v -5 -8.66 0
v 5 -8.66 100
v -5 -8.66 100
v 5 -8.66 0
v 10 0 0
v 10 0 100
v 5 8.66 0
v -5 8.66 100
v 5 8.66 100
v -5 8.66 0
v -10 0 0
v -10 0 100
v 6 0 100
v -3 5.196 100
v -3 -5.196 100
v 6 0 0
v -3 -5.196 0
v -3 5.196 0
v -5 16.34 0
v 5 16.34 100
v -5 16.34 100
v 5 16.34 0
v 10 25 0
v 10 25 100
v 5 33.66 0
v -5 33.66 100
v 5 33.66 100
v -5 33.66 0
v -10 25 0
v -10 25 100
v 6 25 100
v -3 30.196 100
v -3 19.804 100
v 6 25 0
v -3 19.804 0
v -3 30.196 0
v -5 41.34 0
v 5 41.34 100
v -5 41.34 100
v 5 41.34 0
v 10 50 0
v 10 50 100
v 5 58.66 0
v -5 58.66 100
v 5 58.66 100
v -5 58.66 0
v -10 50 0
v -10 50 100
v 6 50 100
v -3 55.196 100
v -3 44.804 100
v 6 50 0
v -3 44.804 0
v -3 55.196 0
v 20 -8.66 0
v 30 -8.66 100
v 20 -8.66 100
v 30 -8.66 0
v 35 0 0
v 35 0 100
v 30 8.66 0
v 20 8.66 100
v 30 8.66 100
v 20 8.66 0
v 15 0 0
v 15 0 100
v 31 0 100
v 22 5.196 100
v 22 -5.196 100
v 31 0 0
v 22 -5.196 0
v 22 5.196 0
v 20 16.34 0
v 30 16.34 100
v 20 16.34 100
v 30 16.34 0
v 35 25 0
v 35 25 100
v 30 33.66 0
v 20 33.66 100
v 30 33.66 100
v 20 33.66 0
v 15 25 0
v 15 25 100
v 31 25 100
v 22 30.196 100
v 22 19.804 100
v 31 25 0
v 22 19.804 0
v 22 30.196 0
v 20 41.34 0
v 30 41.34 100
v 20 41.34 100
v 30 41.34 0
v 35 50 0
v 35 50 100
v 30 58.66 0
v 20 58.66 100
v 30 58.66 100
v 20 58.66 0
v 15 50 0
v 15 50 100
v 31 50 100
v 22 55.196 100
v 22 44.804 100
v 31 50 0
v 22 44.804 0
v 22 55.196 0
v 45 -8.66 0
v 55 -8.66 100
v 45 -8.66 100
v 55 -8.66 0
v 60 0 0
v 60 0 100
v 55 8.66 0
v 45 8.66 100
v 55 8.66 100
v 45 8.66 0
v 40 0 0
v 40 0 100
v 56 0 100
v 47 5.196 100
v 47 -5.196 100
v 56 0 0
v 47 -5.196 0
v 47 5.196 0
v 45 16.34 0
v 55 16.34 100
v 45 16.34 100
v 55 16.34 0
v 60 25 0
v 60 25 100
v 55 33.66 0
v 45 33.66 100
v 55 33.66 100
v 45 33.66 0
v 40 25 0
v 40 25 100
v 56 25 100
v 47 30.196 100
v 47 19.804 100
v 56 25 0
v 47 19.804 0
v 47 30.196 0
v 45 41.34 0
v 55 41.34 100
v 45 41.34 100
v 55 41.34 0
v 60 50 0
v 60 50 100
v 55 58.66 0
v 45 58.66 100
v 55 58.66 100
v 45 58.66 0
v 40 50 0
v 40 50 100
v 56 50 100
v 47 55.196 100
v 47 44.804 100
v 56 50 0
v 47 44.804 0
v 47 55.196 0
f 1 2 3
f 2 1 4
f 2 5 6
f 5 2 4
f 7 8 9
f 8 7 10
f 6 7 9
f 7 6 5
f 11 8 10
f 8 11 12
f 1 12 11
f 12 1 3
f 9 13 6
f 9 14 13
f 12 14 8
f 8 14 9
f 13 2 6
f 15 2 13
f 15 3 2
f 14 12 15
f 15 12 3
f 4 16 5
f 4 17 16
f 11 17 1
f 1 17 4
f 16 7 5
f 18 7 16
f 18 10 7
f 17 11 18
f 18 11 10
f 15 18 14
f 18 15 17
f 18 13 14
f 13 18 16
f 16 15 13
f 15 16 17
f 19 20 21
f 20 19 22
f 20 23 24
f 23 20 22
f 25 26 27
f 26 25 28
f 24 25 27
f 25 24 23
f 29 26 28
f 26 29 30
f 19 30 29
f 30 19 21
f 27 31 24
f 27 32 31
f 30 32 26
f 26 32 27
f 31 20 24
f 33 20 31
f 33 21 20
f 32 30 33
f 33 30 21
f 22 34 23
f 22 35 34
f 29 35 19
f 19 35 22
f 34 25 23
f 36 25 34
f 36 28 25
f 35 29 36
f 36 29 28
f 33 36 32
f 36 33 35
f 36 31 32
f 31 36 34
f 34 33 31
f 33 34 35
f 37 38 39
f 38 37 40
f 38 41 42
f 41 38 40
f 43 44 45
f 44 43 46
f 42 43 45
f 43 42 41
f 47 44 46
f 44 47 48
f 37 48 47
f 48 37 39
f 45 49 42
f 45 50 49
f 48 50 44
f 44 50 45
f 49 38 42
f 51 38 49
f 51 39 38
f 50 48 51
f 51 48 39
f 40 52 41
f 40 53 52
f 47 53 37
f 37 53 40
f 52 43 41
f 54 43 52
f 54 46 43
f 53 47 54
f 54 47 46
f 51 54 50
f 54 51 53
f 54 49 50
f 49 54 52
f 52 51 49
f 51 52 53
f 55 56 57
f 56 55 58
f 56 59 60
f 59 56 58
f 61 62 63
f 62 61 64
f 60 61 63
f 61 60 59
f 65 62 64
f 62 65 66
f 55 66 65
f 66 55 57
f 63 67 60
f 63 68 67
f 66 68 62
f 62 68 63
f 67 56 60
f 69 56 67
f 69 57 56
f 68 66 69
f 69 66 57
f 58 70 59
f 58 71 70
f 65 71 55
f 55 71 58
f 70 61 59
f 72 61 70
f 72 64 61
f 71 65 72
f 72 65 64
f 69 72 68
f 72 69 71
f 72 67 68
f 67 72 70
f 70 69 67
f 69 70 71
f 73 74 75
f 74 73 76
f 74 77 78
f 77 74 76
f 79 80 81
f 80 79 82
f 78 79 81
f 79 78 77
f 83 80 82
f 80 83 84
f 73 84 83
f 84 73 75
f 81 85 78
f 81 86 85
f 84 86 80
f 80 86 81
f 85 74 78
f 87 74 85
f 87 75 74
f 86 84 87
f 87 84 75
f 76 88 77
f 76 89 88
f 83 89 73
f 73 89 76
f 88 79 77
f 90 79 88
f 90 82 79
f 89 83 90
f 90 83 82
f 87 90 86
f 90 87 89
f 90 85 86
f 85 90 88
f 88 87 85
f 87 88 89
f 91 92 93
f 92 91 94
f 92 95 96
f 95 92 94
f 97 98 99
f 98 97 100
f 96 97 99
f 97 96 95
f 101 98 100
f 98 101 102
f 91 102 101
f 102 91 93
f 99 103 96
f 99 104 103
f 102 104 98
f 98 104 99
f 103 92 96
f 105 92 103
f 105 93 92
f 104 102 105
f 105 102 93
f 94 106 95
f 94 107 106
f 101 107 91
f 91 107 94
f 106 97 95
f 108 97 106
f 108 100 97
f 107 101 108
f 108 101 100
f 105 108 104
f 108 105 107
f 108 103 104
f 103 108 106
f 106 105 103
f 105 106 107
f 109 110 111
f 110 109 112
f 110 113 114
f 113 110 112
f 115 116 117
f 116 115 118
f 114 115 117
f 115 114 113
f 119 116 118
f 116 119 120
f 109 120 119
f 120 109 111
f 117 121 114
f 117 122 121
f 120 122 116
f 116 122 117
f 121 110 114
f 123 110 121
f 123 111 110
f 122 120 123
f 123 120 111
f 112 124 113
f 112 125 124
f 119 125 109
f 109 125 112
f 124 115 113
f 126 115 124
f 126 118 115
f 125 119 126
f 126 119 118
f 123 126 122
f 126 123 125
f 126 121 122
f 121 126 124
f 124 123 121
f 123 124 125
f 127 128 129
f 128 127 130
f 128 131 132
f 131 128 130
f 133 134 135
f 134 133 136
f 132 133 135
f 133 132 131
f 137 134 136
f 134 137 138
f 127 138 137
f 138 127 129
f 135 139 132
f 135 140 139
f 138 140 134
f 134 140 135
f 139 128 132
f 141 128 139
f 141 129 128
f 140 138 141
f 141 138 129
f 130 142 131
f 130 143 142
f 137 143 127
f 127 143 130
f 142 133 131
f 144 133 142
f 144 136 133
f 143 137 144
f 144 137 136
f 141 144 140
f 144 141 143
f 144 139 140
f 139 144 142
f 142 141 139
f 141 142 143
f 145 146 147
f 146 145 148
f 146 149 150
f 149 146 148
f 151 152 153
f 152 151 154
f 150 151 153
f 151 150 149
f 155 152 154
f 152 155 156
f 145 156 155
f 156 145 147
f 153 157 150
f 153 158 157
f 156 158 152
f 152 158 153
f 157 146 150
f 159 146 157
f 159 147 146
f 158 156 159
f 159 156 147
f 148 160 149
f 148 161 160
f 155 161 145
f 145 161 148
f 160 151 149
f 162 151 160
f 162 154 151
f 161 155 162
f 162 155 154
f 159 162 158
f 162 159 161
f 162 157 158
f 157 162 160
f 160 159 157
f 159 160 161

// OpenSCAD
for(x=[0:25:50]){
    for(y=[0:25:50]){

translate([x,y,0])
difference(){
    cylinder(100,10,10,$fn=6);
    cylinder(100,6,6,$fn=3);
    
    };
}
}
